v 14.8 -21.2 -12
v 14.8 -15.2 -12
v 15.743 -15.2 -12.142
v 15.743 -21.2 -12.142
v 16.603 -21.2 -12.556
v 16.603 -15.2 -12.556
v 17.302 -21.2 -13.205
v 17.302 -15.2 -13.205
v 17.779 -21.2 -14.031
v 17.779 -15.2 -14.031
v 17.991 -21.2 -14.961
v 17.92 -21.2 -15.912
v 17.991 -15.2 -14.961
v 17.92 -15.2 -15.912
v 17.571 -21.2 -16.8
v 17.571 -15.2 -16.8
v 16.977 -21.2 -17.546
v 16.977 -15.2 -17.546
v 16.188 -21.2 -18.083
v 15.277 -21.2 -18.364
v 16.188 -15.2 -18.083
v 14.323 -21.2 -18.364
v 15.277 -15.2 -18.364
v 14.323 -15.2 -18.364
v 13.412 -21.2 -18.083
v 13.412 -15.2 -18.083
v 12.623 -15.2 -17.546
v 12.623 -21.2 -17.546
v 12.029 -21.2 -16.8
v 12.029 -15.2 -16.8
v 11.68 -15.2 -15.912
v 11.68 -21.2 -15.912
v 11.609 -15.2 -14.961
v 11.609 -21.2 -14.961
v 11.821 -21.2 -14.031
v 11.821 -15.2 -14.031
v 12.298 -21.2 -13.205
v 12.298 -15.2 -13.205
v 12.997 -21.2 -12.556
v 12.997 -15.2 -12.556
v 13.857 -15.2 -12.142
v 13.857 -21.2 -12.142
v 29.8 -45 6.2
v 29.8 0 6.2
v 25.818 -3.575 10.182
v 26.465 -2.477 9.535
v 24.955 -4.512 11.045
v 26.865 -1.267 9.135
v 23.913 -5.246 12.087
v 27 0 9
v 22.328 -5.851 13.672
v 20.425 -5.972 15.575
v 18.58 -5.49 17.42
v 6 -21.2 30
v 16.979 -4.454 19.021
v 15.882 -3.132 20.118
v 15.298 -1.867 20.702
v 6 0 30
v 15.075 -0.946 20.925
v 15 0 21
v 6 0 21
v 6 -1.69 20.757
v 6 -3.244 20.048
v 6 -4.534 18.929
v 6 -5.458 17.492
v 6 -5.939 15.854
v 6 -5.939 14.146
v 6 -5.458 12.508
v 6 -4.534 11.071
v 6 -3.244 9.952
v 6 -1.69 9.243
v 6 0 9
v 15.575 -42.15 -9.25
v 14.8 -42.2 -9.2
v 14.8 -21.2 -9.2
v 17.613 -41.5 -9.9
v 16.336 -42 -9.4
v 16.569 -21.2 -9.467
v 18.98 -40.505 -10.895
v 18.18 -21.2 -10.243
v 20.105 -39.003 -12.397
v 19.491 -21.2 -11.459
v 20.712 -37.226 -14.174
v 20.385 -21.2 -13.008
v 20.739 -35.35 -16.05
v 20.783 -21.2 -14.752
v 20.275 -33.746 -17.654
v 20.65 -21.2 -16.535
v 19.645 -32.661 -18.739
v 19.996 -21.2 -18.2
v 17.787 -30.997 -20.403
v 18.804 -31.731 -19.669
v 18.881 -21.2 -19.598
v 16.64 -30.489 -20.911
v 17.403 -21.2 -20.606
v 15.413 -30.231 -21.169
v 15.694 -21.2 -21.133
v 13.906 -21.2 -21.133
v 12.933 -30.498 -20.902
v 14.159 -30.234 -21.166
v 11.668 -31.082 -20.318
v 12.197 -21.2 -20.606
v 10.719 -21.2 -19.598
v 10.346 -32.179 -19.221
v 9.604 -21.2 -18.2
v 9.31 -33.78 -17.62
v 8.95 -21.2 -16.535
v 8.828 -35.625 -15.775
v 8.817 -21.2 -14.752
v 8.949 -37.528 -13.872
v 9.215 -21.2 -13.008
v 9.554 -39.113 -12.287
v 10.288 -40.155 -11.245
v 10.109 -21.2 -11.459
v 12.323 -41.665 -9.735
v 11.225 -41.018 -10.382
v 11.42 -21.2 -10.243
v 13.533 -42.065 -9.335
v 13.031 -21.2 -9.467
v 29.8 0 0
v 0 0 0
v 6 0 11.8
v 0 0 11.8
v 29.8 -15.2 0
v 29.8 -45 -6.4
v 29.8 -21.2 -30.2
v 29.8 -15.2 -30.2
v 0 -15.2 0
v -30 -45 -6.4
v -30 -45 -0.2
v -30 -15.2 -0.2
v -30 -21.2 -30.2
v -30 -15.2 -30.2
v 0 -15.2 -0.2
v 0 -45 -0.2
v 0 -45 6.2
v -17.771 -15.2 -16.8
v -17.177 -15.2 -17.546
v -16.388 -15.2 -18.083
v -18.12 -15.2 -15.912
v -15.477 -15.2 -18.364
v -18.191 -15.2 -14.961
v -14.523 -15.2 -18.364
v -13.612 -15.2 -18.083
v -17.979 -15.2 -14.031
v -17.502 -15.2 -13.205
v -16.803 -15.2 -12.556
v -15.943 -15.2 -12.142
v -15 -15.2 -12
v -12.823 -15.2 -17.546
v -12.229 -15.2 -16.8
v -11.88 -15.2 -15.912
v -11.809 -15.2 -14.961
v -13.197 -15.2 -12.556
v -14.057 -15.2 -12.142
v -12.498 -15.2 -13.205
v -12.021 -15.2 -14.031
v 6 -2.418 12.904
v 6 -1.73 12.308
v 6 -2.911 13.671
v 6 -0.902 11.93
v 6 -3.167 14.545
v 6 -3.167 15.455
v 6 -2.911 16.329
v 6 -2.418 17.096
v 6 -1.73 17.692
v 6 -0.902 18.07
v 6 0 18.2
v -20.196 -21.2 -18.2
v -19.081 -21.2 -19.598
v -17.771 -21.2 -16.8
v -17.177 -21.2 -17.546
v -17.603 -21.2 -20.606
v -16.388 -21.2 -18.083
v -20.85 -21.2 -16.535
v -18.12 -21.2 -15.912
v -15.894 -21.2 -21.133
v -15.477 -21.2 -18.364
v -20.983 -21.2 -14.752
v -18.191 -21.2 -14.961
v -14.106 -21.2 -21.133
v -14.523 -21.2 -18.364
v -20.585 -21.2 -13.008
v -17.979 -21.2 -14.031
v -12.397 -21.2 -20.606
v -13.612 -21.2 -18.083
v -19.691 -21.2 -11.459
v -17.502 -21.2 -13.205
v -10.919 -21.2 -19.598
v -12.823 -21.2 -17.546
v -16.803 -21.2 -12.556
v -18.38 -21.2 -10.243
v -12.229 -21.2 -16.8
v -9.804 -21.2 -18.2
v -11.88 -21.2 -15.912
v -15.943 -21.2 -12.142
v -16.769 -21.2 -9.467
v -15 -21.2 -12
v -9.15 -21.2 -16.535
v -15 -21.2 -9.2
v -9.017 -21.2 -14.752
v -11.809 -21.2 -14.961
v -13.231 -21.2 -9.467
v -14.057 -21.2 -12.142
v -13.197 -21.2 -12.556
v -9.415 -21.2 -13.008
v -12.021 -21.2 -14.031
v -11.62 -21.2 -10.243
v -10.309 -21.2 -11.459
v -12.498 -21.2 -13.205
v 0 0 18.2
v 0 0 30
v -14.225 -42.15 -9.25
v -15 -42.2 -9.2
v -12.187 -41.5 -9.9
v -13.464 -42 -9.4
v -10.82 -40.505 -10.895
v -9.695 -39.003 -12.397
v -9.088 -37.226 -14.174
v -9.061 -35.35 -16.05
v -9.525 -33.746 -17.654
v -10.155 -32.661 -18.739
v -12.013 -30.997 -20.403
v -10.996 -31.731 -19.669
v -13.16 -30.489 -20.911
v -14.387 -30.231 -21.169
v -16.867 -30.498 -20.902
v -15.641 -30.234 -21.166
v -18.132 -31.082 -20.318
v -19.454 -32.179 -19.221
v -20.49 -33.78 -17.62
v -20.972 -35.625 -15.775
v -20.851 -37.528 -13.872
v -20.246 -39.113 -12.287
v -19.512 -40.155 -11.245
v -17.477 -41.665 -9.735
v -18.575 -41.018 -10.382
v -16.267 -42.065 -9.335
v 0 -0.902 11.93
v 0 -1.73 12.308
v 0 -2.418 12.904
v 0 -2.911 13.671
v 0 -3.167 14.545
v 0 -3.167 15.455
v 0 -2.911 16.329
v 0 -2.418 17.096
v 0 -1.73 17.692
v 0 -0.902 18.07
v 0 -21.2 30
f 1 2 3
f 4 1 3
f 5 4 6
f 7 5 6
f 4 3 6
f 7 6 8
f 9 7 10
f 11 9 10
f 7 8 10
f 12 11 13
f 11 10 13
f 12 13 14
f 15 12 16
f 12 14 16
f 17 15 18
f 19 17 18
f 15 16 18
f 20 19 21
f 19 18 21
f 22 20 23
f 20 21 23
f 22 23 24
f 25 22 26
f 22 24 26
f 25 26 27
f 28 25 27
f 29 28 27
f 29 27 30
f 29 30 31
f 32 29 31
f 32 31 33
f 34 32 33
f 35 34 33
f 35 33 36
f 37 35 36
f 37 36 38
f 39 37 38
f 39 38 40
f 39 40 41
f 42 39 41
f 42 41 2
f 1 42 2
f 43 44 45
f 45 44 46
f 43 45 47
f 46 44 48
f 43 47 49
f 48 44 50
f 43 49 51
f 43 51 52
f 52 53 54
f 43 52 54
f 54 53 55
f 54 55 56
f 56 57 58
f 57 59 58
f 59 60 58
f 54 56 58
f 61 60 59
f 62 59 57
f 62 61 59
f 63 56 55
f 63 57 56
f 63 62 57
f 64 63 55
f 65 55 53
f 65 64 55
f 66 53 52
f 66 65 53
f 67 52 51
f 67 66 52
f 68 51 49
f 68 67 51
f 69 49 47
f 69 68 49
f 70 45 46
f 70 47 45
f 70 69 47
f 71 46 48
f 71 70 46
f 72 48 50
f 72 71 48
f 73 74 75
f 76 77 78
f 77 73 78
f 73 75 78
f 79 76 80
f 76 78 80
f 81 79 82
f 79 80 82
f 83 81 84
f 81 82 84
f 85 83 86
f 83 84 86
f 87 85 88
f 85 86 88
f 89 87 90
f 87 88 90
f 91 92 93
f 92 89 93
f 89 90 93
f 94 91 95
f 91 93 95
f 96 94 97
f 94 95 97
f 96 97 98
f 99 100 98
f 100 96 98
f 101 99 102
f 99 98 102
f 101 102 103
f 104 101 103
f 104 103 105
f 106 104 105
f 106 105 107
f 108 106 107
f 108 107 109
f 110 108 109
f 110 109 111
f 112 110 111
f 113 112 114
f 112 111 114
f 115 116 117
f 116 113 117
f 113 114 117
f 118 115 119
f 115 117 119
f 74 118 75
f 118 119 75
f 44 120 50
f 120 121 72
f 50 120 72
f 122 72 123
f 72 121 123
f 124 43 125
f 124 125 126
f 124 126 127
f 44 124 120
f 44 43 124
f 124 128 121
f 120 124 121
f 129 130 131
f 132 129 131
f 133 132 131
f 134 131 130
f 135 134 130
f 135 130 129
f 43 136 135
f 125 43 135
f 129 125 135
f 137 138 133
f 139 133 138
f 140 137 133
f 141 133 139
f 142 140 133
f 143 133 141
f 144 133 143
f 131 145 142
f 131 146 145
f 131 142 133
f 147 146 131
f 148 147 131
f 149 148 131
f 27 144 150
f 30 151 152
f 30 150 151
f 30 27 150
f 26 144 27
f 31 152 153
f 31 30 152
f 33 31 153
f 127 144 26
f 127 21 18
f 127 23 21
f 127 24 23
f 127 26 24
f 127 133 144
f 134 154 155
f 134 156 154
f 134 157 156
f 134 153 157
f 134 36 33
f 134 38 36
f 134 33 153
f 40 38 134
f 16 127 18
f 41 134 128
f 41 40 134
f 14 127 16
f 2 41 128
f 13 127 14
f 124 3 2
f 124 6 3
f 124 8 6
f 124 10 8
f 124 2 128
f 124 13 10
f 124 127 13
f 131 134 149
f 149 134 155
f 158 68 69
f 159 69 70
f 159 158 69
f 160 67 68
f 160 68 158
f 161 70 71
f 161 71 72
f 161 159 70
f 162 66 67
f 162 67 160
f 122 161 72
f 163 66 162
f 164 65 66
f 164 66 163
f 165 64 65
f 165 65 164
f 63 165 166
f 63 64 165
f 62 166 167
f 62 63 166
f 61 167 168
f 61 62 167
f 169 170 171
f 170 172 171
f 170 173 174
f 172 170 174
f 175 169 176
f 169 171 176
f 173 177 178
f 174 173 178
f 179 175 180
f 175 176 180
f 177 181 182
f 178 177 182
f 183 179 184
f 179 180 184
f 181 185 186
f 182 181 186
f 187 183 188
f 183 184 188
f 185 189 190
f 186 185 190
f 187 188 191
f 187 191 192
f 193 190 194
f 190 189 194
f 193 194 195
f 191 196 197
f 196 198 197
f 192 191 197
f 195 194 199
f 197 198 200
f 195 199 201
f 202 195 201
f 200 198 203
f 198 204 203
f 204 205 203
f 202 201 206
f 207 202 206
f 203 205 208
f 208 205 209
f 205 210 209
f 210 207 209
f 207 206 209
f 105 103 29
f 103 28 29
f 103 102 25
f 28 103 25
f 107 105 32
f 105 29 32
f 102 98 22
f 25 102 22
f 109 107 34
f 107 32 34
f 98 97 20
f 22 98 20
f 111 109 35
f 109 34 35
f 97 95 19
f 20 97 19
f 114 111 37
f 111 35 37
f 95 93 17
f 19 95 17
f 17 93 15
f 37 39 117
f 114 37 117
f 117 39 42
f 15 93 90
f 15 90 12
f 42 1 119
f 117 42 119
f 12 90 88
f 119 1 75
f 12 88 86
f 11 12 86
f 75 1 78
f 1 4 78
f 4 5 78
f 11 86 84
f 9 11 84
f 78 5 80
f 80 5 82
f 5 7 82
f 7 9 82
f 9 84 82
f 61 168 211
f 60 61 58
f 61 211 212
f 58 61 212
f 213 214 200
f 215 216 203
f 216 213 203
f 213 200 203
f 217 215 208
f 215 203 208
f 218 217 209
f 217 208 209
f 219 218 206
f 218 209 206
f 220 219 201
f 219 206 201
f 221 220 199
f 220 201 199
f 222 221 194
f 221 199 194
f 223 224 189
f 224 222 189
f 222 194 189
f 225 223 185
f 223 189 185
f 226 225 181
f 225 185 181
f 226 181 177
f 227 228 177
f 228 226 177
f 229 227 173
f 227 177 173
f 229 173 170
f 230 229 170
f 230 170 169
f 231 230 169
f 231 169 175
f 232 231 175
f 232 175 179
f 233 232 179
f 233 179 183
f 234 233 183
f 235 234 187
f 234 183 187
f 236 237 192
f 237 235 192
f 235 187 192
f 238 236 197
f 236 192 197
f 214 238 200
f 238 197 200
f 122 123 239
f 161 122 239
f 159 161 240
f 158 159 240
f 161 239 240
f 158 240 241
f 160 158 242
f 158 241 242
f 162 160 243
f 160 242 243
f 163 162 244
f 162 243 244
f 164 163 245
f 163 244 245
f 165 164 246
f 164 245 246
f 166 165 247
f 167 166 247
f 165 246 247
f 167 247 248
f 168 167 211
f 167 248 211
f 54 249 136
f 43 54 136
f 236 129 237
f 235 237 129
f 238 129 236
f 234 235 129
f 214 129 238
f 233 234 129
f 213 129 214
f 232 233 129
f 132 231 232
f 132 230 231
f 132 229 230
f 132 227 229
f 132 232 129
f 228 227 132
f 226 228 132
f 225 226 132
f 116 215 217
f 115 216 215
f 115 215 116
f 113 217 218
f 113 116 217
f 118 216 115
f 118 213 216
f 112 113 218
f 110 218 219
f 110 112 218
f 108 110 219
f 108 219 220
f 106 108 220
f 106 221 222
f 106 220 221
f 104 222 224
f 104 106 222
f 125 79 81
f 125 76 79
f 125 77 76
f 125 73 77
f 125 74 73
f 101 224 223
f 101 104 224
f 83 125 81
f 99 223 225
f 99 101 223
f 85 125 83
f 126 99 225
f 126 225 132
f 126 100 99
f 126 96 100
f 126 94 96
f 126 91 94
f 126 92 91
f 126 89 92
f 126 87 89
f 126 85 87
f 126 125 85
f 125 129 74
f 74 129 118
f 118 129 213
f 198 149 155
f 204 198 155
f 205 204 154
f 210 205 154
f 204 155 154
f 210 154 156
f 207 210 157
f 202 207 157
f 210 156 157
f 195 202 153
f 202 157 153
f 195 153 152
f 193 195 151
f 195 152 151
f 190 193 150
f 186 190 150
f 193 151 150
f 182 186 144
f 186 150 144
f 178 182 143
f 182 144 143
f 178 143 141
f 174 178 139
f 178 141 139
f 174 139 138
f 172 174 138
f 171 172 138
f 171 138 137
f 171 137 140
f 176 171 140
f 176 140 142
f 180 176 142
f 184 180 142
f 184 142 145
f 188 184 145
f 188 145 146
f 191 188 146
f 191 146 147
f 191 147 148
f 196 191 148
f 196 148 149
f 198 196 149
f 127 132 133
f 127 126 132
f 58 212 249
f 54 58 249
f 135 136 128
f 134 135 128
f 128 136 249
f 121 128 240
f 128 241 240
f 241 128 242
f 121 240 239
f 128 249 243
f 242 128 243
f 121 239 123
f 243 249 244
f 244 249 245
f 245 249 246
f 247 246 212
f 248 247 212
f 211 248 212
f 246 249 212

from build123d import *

# Parameters (mm, degrees)
BOSS_EXTRUDE1_DEPTH = 29.8
BOSS_EXTRUDE2_DEPTH = 30
SKETCH2_R           = 3.2
CUT_EXTRUDE1_DEPTH  = 62.943845538
CUT_EXTRUDE2_START  = -21.2
SKETCH2_3_R         = 6
SKETCH2_3_R_2       = 3.2
CUT_EXTRUDE2_DEPTH  = 41.743845538
CUT_EXTRUDE3_START  = 6
CUT_EXTRUDE3_DEPTH  = 56.943845538


with BuildPart() as part:
    # Sketch1 → Boss-Extrude1 (new body)
    with BuildSketch(Plane.YZ):
        with BuildLine():
            Line((-15.2, 0), (0, 0))
            Line((0, 0), (0, 11.8))
            ThreePointArc((0, 11.8), (-3.2, 15), (0, 18.2))
            Line((0, 18.2), (0, 30))
            Line((0, 30), (-21.2, 30))
            Line((-21.2, 30), (-45, 6.2))
            Line((-45, 6.2), (-45, -6.4))
            Line((-45, -6.4), (-21.2, -30.2))
            Line((-21.2, -30.2), (-15.2, -30.2))
            Line((-15.2, -30.2), (-15.2, 0))
        make_face()
    extrude(amount=BOSS_EXTRUDE1_DEPTH)

    # Sketch1<3> → Boss-Extrude2 (add)
    with BuildSketch(Plane.YZ):
        Polygon((-15.2, -30.2), (-15.2, -0.2), (-45, -0.2), (-45, -6.4), (-21.2, -30.2), align=None)
    extrude(amount=-BOSS_EXTRUDE2_DEPTH)

    # Sketch2 → Cut-Extrude1 (cut, through all)
    with BuildSketch(Plane(origin=(0, 0, 0), x_dir=(-1, 0, 0), z_dir=(0, 1, 0))):
        Polygon((-29.8, 18.2), (-17.8, 18.2), (-6, 30), (-29.8, 30), align=None)
        Polygon((-29.8, 11.8), (-24.2, 11.8), (-17.8, 18.2), (-29.8, 18.2), align=None)
        Polygon((-29.8, 11.8), (-29.8, 6.2), (-24.2, 11.8), align=None)
        with Locations(Location((-14.8, -15.2, 0), (0, 0, 90))):
            Circle(SKETCH2_R)
        with Locations(Location((15, -15.2, 0), (0, 0, 90))):
            Circle(SKETCH2_R)
    extrude(amount=-CUT_EXTRUDE1_DEPTH, mode=Mode.SUBTRACT)

    # Sketch2<3> → Cut-Extrude2 (cut, through all)
    # profile 1 of 2: a face of its own
    with BuildSketch(Plane(origin=(0, 0, 0), x_dir=(-1, 0, 0), z_dir=(0, 1, 0)).offset(CUT_EXTRUDE2_START)):
        with Locations(Location((-14.8, -15.2, 0), (0, 0, 90))):
            Circle(SKETCH2_3_R)
        with Locations(Location((-14.8, -15.2, 0), (0, 0, 90))):
            Circle(SKETCH2_3_R_2, mode=Mode.SUBTRACT)
    # profile 2 of 2: a face of its own
    with BuildSketch(Plane(origin=(0, 0, 0), x_dir=(-1, 0, 0), z_dir=(0, 1, 0)).offset(CUT_EXTRUDE2_START)):
        with Locations(Location((15, -15.2, 0), (0, 0, 90))):
            Circle(SKETCH2_3_R)
        with Locations(Location((15, -15.2, 0), (0, 0, 90))):
            Circle(SKETCH2_3_R_2, mode=Mode.SUBTRACT)
    extrude(amount=-CUT_EXTRUDE2_DEPTH, mode=Mode.SUBTRACT)

    # Sketch1<4> → Cut-Extrude3 (cut, through all)
    with BuildSketch(Plane.YZ.offset(CUT_EXTRUDE3_START)):
        with BuildLine():
            ThreePointArc((0, 21), (-6, 15), (0, 9))
            Line((0, 9), (0, 11.8))
            ThreePointArc((0, 11.8), (-3.2, 15), (0, 18.2))
            Line((0, 18.2), (0, 21))
        make_face()
        with BuildLine():
            Line((0, 11.8), (0, 9))
            ThreePointArc((0, 9), (4.242640687, 10.757359313), (6, 15))
            ThreePointArc((6, 15), (4.242640687, 19.242640687), (0, 21))
            Line((0, 21), (0, 18.2))
            ThreePointArc((0, 18.2), (2.2627417, 17.2627417), (3.2, 15))
            ThreePointArc((3.2, 15), (2.2627417, 12.7372583), (0, 11.8))
        make_face()
    extrude(amount=CUT_EXTRUDE3_DEPTH, mode=Mode.SUBTRACT)


solid = part.part
